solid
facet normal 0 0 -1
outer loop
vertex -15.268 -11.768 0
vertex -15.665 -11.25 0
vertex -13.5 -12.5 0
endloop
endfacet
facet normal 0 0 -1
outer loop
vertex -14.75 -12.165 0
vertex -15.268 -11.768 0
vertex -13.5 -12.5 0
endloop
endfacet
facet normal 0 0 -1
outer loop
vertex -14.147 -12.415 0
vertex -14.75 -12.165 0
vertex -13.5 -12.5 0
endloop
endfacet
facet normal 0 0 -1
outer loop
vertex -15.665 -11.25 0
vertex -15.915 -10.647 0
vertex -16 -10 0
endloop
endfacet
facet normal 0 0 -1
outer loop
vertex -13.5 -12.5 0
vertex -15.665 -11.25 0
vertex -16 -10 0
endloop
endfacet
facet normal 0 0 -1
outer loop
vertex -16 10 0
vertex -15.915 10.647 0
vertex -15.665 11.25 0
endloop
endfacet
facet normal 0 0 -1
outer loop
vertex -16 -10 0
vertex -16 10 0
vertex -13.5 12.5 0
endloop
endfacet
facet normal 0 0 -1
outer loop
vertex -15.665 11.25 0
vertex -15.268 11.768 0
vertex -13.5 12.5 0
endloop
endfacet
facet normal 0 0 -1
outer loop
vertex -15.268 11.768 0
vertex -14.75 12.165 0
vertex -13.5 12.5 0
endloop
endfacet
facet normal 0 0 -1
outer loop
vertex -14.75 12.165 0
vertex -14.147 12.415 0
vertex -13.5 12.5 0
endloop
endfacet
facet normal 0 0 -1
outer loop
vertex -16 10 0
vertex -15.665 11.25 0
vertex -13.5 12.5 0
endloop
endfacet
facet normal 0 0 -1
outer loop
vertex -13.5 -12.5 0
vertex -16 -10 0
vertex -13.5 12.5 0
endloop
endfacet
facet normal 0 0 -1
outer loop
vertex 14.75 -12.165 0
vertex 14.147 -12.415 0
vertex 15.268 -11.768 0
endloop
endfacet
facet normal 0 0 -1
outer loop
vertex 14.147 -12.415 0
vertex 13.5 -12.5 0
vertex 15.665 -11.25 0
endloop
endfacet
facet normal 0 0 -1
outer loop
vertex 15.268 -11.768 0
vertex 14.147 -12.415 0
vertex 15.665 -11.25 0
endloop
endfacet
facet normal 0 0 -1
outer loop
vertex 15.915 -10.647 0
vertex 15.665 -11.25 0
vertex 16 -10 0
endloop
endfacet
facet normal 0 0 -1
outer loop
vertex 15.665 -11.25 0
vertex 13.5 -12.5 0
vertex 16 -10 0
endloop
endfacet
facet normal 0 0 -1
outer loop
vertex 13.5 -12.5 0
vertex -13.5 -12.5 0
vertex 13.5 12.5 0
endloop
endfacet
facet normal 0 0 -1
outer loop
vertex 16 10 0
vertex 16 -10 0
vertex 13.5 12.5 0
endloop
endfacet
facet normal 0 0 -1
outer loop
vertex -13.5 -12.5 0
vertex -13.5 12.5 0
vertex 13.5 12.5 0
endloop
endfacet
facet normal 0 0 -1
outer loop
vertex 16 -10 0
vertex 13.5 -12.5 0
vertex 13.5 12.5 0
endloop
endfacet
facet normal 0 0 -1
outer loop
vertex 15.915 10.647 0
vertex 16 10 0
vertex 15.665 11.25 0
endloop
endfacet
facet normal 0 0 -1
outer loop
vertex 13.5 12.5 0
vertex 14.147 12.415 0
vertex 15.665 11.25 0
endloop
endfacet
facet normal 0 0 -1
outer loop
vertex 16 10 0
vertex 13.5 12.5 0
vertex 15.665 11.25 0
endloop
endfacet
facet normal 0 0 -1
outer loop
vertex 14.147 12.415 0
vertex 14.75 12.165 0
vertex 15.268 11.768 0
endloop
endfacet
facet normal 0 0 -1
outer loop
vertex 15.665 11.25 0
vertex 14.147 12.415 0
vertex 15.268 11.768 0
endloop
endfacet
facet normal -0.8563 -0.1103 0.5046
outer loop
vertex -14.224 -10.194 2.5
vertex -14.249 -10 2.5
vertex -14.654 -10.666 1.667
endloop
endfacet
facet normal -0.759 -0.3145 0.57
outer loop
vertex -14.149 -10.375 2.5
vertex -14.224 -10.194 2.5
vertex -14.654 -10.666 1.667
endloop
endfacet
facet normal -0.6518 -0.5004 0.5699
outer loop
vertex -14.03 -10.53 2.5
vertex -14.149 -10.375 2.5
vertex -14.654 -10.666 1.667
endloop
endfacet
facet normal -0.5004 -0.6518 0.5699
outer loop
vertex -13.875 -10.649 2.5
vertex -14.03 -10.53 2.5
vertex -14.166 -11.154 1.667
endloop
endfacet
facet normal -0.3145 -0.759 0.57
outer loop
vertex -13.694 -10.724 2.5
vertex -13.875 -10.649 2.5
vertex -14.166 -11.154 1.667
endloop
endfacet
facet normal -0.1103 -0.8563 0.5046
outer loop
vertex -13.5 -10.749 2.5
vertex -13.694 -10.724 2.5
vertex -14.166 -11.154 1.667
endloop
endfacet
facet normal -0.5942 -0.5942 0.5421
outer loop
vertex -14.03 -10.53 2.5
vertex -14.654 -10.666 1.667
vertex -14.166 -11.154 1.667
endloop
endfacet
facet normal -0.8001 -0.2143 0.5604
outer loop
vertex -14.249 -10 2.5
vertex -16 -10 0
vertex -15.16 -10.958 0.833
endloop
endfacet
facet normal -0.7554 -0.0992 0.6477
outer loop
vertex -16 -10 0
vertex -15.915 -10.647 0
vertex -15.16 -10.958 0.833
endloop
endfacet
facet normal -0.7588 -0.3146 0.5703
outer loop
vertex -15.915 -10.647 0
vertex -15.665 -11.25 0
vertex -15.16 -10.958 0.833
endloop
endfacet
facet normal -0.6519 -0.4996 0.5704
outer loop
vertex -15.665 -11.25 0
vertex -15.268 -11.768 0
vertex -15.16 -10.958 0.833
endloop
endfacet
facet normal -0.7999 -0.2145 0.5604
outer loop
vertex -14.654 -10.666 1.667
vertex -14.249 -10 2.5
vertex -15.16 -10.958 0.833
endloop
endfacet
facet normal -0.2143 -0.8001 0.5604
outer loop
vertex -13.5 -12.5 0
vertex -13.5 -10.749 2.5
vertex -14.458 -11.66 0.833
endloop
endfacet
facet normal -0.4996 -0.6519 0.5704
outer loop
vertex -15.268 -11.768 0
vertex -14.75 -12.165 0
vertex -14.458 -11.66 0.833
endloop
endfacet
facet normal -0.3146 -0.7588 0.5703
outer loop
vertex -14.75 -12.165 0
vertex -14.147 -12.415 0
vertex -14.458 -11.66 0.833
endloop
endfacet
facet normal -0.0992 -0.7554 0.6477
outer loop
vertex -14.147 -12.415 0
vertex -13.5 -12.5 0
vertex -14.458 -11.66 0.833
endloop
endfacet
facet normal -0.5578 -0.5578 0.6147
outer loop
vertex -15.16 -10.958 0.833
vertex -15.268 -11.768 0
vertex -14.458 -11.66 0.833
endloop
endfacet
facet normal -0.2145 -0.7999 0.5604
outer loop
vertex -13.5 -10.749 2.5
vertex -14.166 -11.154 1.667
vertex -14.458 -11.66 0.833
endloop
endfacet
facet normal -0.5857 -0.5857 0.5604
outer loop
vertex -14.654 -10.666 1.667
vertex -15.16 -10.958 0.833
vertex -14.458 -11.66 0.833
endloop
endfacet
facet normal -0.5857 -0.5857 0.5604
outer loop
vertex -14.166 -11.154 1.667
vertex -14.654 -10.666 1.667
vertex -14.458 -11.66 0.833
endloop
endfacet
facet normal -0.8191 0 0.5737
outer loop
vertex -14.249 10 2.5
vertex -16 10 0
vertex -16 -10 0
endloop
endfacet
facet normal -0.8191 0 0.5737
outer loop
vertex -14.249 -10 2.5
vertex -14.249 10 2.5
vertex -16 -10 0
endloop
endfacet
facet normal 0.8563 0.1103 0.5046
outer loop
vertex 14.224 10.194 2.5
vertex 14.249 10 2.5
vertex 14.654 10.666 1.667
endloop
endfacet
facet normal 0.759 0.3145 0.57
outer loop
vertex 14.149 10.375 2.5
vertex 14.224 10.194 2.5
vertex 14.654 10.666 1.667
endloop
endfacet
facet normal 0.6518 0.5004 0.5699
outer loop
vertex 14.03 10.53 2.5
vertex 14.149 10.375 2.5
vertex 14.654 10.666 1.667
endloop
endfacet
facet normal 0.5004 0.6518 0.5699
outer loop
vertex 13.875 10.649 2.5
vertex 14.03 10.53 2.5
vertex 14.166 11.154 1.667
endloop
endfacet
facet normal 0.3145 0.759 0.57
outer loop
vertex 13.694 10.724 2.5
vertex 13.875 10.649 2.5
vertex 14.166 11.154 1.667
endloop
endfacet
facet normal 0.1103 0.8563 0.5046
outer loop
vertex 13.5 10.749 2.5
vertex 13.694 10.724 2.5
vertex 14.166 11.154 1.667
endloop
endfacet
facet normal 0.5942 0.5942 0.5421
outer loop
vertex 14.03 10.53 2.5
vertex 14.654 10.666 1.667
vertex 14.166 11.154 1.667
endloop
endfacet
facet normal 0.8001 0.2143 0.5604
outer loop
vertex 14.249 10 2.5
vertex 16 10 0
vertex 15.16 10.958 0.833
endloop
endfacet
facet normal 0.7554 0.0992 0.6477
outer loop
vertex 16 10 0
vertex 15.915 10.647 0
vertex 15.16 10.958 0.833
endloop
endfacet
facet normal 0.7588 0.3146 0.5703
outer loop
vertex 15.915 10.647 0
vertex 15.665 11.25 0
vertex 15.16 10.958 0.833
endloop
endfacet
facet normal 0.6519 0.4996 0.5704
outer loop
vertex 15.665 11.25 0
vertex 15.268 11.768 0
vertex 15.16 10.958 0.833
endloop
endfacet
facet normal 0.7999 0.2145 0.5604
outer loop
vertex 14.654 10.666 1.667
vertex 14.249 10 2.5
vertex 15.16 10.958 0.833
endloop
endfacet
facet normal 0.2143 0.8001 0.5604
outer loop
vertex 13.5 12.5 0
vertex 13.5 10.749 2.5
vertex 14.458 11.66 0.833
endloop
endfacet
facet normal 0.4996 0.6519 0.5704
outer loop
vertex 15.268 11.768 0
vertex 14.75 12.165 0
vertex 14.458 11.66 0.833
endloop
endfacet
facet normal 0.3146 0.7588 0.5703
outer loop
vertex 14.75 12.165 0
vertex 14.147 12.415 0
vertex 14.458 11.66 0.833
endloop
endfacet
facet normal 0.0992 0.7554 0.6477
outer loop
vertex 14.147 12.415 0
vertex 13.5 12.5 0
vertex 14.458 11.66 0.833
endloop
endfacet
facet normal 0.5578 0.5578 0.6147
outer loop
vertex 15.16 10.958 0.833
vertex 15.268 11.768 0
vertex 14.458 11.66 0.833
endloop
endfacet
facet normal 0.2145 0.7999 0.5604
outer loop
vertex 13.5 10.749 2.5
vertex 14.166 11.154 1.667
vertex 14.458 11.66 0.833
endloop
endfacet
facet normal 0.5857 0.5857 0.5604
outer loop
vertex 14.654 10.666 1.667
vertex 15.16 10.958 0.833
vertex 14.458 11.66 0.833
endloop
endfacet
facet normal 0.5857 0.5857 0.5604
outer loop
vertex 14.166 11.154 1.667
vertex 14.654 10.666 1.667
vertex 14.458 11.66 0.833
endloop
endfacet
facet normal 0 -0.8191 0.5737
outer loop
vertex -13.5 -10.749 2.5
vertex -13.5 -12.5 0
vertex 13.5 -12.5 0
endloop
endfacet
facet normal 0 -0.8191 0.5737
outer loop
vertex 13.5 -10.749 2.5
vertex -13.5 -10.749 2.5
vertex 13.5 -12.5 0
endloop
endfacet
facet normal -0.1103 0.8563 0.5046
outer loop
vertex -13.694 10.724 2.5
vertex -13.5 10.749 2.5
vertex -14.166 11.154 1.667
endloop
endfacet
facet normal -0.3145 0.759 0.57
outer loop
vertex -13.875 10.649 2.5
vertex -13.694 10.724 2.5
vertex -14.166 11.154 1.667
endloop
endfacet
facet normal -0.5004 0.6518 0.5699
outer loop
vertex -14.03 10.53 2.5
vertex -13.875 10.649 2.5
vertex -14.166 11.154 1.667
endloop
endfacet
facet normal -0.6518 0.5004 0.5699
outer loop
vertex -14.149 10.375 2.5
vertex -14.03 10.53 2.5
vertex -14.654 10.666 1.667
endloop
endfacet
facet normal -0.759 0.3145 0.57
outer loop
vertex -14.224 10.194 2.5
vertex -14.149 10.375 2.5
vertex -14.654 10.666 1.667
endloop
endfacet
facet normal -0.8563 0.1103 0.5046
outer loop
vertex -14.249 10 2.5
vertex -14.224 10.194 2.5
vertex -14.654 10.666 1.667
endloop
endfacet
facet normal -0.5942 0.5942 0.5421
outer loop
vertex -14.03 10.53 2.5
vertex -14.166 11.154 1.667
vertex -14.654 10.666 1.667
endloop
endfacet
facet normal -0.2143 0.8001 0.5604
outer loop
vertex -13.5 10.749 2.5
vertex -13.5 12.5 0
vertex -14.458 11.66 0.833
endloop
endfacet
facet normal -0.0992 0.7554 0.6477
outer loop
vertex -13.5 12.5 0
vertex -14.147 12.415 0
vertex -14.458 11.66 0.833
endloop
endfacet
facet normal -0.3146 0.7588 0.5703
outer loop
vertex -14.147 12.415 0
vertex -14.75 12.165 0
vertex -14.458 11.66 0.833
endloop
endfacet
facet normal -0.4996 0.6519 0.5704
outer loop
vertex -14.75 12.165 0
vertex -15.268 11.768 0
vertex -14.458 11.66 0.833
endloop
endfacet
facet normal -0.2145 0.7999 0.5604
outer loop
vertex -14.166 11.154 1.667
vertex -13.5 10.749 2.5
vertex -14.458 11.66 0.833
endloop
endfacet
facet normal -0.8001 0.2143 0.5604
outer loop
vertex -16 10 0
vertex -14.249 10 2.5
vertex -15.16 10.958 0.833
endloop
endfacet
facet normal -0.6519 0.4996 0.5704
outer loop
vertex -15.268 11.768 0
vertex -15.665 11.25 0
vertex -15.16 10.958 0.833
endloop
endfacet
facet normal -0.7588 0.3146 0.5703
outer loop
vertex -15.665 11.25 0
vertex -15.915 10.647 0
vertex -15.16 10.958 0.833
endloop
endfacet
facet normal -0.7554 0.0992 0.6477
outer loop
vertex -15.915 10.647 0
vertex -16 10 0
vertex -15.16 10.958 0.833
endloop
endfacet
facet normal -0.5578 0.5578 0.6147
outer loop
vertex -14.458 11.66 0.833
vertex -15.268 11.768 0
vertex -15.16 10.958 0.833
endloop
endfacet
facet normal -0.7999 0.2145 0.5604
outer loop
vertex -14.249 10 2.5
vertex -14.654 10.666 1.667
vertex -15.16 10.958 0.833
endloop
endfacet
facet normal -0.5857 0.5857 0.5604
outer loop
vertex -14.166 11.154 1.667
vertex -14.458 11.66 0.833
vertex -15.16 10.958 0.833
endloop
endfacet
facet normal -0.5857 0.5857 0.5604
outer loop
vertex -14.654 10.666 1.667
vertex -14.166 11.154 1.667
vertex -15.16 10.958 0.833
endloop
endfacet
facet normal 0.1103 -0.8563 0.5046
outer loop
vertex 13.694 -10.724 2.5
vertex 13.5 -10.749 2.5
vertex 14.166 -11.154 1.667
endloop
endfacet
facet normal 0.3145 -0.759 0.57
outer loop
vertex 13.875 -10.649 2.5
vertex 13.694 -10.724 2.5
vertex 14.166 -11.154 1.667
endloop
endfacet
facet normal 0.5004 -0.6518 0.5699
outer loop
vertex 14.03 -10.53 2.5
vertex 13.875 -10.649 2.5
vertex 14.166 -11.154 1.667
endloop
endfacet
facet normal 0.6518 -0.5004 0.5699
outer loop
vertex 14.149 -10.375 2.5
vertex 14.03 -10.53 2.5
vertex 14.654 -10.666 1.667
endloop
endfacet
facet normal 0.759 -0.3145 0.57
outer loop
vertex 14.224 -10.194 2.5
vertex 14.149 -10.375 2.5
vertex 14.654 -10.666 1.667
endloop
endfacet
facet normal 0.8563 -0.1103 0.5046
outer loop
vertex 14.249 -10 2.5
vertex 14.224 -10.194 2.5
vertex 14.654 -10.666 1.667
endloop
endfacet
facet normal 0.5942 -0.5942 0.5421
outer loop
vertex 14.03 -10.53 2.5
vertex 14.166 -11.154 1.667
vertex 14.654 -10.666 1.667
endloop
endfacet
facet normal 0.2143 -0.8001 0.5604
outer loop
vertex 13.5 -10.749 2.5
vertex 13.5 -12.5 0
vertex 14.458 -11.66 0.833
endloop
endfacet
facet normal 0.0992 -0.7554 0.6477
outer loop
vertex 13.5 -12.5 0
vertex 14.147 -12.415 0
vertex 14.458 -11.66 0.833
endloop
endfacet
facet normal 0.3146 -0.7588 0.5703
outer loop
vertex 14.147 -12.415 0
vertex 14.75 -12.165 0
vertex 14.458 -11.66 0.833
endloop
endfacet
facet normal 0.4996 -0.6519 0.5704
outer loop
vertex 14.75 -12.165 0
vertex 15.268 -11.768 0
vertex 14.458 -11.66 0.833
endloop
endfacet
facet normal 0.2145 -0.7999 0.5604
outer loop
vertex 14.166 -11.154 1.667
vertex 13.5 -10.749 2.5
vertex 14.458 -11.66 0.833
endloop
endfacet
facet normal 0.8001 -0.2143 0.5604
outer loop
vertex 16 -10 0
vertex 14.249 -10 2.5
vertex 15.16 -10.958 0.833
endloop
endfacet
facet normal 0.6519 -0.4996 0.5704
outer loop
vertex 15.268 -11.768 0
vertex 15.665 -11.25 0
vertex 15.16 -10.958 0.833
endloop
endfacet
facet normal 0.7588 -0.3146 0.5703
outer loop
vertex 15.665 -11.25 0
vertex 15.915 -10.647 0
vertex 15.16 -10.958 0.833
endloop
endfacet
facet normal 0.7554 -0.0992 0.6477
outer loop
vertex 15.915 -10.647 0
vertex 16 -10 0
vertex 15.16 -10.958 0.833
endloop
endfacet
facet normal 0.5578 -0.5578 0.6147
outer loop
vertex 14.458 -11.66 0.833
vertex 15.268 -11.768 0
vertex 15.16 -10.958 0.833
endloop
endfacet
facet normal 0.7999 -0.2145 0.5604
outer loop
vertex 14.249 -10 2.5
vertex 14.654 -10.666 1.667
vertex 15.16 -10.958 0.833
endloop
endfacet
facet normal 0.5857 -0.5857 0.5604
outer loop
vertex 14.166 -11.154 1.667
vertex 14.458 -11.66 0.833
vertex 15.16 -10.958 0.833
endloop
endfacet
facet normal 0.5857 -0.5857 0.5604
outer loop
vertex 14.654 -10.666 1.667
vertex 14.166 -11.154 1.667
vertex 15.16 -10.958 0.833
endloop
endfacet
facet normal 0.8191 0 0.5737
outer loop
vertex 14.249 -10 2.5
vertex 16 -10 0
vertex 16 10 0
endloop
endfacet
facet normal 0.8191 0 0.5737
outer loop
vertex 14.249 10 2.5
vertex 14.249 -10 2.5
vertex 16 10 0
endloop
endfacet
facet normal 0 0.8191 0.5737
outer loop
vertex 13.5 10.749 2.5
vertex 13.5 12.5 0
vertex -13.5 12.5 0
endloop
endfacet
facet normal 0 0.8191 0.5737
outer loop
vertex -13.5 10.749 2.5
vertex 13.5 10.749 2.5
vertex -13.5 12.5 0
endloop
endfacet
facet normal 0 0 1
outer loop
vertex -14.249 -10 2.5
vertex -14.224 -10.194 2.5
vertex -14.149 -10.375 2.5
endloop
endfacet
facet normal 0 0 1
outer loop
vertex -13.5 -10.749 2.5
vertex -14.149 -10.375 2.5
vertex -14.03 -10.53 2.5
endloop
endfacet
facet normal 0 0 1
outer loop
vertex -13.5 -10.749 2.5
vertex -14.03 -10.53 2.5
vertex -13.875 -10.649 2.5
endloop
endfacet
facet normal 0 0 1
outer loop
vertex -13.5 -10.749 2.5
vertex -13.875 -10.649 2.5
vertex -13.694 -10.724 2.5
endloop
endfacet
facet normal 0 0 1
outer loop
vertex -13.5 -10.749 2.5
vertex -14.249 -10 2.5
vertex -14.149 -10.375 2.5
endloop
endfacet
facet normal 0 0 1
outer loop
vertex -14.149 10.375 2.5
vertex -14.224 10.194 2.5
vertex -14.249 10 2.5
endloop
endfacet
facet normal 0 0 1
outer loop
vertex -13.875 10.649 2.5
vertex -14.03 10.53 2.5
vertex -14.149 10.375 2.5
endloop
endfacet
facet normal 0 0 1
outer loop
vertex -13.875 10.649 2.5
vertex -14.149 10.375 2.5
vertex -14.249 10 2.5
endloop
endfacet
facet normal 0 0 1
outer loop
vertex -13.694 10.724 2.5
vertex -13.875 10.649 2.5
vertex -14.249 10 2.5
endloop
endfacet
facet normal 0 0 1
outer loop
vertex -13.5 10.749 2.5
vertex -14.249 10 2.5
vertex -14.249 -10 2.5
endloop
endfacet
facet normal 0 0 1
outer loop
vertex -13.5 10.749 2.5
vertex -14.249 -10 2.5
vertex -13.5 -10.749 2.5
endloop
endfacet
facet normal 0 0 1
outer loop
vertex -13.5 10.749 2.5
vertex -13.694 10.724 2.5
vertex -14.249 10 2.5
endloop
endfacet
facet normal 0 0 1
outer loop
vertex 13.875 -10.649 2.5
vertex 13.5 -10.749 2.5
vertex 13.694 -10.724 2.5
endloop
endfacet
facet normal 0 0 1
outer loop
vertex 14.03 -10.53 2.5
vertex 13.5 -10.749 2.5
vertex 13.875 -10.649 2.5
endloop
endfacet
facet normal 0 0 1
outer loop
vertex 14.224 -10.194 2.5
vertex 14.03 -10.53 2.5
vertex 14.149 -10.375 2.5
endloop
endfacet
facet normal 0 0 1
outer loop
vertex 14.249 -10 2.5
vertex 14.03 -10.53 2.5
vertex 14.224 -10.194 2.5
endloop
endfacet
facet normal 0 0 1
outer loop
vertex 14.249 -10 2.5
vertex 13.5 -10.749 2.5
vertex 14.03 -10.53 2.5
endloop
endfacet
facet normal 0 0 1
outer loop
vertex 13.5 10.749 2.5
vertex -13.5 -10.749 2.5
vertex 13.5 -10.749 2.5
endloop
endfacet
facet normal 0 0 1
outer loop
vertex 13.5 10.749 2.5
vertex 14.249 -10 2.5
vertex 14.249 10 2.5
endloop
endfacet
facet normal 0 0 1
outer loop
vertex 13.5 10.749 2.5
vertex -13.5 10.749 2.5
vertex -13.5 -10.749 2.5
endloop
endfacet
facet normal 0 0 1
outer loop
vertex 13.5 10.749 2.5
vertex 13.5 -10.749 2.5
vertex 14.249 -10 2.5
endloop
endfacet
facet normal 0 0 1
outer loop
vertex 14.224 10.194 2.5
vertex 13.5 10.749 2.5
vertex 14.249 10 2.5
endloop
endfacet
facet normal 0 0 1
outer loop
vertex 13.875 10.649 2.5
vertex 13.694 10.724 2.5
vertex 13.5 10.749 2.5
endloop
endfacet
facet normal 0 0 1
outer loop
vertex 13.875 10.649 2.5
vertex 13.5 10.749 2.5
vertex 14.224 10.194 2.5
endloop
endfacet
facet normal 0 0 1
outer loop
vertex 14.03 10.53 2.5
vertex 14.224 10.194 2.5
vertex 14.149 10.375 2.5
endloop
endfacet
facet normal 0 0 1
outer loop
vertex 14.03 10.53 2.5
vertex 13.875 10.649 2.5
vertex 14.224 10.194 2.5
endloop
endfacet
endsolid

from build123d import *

# Parameters (mm, degrees)
F0_W     = 32
F0_H     = 25
F1_DEPTH = 2.5
F2_R     = 2.5
F3_SIZE2 = 2.49999
F3_SIZE  = 1.750509


# Not quite as in the source:
# - a fillet or chamfer is up to 0.001 mm smaller than in the source, because OpenCascade refuses the exact size


with BuildPart() as f1:
    # F0 (on Top) → F1 (new body)
    with BuildSketch(Plane.XY):
        Rectangle(F0_W, F0_H)
    extrude(amount=F1_DEPTH)

    # F2
    f2_edges = [f1.edges().sort_by_distance(p)[0] for p in [
        (-16, -12.5, 1.25),
        (16, -12.5, 1.25),
        (16, 12.5, 1.25),
        (-16, 12.5, 1.25),
    ]]
    fillet(f2_edges, radius=F2_R)

    # F3 (size 1.7505188455 and 2.5 in the source; OpenCascade refuses exactly that, so slightly less here)
    f3_edges = [f1.edges().sort_by_distance(p)[0] for p in [
        (0, -12.5, 2.5),
        (-16, 0, 2.5),
        (15.267767, -11.767767, 2.5),
        (16, 0, 2.5),
        (15.267767, 11.767767, 2.5),
        (0, 12.5, 2.5),
        (-15.267767, 11.767767, 2.5),
        (-15.267767, -11.767767, 2.5),
    ]]
    f3_side = f1.faces().sort_by_distance((0, 0, 2.5))[0]
    chamfer(f3_edges, length=F3_SIZE, length2=F3_SIZE2, reference=f3_side)


solid = f1.part
